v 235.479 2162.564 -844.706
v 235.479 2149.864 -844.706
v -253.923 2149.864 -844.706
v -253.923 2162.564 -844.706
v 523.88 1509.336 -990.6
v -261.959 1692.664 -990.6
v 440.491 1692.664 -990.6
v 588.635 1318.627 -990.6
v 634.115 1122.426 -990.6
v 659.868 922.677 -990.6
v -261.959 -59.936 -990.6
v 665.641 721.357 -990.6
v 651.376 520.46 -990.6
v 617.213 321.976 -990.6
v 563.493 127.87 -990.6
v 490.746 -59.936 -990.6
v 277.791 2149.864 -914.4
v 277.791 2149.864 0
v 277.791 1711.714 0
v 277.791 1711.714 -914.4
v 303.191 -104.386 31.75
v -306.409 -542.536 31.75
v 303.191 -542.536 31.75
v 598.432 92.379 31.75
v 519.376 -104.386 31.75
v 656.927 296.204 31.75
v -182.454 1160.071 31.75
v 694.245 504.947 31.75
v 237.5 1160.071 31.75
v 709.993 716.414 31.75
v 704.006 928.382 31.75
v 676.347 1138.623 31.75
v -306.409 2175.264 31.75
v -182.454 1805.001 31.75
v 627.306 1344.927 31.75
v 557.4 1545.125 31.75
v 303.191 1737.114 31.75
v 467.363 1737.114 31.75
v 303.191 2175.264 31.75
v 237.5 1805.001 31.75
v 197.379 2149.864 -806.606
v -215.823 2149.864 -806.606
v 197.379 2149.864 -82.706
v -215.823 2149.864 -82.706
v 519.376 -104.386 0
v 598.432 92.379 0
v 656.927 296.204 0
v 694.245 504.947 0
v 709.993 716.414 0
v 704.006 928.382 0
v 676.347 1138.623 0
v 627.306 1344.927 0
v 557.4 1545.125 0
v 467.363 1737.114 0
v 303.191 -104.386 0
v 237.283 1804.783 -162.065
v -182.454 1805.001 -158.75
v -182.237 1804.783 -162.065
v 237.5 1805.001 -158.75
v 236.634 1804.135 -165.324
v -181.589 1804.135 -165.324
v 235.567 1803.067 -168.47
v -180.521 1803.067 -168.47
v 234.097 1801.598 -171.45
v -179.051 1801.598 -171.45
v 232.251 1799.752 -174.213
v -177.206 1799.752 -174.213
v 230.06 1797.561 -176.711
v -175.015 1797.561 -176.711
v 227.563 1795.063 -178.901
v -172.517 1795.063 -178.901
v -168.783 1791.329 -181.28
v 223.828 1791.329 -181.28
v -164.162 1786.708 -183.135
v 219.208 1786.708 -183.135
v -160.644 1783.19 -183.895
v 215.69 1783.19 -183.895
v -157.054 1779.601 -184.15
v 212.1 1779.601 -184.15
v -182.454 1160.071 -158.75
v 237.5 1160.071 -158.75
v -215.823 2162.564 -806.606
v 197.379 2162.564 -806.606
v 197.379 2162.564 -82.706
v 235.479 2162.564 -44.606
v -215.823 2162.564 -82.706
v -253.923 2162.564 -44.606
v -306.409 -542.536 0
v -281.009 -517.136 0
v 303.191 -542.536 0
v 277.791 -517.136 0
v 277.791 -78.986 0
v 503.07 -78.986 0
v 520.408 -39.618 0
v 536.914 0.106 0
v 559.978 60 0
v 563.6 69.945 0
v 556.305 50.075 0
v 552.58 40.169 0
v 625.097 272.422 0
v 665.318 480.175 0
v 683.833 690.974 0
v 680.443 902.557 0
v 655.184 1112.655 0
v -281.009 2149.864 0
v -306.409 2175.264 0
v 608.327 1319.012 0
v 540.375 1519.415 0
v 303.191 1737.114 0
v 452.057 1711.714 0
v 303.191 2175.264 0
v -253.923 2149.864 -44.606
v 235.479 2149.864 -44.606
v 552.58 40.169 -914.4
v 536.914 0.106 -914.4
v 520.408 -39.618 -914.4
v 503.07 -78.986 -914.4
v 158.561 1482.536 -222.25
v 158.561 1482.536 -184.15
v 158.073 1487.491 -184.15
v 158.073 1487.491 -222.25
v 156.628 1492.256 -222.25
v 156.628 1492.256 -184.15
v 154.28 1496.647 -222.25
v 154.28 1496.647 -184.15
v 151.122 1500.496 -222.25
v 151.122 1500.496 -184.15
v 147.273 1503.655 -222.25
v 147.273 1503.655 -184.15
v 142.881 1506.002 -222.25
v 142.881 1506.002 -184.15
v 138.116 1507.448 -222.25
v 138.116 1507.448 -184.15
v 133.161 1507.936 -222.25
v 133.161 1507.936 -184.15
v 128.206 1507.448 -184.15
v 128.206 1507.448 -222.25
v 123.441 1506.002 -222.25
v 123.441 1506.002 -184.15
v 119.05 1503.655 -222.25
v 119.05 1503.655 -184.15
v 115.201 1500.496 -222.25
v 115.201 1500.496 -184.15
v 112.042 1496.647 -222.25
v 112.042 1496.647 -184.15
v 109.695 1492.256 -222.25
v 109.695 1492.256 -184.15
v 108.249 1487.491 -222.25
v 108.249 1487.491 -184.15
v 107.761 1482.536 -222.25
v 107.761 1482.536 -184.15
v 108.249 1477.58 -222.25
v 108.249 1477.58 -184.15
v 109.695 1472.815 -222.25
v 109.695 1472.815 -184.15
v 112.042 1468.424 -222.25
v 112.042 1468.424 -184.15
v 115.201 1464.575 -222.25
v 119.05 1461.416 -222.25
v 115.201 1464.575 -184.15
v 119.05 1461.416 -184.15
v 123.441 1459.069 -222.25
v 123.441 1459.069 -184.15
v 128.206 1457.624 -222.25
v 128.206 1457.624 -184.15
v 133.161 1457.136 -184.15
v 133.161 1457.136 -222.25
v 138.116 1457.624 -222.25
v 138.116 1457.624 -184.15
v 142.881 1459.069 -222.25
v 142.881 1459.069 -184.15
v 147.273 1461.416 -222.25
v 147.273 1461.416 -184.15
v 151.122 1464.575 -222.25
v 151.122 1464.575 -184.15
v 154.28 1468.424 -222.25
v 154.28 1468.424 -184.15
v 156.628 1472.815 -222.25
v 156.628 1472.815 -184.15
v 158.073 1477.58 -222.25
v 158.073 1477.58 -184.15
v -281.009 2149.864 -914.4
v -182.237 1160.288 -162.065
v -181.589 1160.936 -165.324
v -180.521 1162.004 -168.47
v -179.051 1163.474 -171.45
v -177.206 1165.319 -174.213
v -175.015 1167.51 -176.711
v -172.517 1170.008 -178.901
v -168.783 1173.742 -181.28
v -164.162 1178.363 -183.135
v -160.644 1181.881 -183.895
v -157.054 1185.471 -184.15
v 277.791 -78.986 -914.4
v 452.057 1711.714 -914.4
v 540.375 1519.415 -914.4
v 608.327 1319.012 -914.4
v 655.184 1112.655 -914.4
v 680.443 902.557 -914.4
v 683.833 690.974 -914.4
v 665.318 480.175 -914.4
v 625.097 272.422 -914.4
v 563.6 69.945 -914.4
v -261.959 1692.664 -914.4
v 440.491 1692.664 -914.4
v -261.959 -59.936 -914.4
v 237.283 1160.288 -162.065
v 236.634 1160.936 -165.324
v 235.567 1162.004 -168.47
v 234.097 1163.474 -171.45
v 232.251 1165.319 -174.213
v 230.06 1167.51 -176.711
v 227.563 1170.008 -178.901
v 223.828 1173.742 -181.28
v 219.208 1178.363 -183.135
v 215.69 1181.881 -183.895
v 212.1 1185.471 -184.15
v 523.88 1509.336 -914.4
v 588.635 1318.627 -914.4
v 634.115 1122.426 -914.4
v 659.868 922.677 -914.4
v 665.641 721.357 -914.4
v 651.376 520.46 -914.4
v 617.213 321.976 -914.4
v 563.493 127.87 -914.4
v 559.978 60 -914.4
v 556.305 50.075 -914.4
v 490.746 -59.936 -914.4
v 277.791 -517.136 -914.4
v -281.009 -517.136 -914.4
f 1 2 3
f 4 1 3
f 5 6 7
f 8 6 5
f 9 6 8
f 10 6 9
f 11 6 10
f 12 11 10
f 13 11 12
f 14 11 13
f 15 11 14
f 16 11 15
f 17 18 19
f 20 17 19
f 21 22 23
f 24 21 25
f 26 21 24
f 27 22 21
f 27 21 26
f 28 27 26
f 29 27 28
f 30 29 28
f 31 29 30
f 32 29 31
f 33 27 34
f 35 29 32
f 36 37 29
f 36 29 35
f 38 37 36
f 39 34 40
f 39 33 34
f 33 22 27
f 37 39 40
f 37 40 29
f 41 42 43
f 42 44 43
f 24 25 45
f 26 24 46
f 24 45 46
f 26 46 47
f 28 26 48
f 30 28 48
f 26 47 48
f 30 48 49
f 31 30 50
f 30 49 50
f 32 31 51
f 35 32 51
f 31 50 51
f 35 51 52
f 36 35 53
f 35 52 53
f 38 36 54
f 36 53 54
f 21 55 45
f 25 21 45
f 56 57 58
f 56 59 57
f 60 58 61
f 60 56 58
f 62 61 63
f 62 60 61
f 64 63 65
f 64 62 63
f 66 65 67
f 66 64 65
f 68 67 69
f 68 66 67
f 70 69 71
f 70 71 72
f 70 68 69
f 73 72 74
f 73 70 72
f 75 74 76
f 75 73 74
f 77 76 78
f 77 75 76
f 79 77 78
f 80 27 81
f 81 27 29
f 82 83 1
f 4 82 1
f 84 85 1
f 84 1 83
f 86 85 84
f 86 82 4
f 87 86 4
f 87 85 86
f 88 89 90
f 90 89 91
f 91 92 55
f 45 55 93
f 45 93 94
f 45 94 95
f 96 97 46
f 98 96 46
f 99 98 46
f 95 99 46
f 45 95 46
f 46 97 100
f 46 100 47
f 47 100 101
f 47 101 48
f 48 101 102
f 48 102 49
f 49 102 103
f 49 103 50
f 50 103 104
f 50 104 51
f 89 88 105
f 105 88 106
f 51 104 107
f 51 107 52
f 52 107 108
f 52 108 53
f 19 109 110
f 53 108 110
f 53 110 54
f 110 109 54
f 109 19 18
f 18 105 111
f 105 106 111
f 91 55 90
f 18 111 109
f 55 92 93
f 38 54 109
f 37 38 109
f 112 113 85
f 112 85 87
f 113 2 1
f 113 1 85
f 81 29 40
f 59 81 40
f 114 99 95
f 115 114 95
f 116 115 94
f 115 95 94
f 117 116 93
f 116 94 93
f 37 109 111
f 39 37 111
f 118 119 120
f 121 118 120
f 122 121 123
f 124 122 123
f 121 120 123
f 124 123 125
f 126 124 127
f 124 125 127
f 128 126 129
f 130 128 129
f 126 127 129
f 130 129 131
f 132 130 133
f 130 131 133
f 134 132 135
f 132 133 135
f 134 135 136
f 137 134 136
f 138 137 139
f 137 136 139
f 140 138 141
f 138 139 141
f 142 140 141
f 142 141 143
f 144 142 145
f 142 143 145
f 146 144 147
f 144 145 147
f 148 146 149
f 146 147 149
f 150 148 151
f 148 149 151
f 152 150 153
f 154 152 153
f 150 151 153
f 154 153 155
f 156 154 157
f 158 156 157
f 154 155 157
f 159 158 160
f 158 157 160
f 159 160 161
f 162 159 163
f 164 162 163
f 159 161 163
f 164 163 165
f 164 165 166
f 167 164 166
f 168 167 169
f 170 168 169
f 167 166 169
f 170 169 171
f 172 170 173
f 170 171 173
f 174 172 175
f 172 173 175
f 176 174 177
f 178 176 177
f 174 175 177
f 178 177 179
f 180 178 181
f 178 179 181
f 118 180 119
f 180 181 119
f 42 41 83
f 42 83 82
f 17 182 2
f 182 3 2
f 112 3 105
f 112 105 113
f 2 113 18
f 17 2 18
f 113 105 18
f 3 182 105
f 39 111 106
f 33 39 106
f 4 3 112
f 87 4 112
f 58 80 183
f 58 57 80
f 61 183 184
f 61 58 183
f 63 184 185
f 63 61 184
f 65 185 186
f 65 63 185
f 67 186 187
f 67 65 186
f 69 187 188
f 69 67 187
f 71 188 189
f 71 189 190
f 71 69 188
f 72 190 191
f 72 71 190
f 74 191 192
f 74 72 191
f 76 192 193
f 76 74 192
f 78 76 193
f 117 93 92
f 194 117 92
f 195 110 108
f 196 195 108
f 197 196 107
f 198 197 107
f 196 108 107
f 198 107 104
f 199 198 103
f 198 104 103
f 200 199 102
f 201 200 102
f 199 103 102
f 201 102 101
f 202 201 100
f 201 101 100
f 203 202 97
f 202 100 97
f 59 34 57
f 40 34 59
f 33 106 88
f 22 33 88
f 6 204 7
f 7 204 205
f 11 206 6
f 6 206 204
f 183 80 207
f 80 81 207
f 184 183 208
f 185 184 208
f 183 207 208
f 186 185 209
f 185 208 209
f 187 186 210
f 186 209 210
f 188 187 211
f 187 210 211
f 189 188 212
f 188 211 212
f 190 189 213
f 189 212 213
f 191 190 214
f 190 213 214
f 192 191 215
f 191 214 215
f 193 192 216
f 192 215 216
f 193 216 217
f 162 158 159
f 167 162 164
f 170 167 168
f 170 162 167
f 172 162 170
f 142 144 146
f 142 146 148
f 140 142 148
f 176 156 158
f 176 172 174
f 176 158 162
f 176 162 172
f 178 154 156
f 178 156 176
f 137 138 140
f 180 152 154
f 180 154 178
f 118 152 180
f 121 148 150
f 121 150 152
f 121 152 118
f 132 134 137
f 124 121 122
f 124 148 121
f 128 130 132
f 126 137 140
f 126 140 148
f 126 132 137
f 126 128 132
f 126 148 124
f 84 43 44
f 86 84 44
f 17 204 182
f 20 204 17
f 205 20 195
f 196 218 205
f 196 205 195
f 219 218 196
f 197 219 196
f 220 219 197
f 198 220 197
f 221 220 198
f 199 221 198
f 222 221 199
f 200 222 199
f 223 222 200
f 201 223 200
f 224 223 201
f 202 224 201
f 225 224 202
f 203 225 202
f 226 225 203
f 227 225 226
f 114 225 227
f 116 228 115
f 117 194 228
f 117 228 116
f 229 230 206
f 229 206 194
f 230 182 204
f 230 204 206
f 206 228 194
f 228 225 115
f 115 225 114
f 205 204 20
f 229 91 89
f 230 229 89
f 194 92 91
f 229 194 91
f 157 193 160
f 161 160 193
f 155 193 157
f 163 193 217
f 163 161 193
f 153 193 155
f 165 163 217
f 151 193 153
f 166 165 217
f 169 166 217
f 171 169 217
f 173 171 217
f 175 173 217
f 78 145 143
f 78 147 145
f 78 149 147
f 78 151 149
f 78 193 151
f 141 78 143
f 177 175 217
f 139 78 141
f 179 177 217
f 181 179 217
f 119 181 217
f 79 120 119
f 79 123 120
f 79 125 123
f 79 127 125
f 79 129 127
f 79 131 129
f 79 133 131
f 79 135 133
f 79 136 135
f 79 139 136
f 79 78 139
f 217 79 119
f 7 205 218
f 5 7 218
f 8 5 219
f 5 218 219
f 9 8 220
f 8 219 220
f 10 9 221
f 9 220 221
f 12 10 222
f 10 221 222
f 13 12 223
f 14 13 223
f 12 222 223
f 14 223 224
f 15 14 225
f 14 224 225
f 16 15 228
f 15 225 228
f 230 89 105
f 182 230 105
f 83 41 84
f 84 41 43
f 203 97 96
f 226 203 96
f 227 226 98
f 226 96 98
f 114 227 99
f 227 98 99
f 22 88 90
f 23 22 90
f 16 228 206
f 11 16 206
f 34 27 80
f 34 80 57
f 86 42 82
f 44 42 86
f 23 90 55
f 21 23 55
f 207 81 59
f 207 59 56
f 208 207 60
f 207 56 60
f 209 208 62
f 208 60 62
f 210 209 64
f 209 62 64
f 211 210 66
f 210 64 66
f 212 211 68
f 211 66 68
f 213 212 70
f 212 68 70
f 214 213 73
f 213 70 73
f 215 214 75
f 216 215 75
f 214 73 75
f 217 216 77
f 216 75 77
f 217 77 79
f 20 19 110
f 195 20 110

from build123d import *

# Parameters (mm, degrees)
F1_DEPTH  = 31.75
F3_DEPTH  = 914.4
F5_DEPTH  = 76.2
F6_W      = 489.402067
F6_H      = 800.100014
F6_W_2    = 413.202067
F6_H_2    = 723.900014
F7_DEPTH  = 12.7
F8_W      = 419.95435
F8_H      = 644.930006
F9_DEPTH  = 215.9
F10_R     = 25.4
F11_R     = 25.4
F12_DEPTH = 38.1


with BuildPart() as f1:
    # F0 (on Top) → F1 (new body)
    with BuildSketch(Plane.XY):
        with BuildLine():
            Line((-306.409396, 2175.264088), (-306.409396, -542.535912))
            Line((-306.409396, -542.535912), (303.190604, -542.535912))
            Line((303.190604, -542.535912), (303.190604, -104.385912))
            Line((303.190604, -104.385912), (519.375622, -104.385912))
            ThreePointArc((519.375622, -104.385912), (709.71736, 822.474711), (467.363477, 1737.114088))
            Line((467.363477, 1737.114088), (303.190604, 1737.114088))
            Line((303.190604, 1737.114088), (303.190604, 2175.264088))
            Line((303.190604, 2175.264088), (-306.409396, 2175.264088))
        make_face()
    extrude(amount=F1_DEPTH)

    # F2 (on face) → F3 (join)
    with BuildSketch(Plane(origin=(0, 0, 0), x_dir=(1, 0, 0), z_dir=(0, 0, -1))):
        with BuildLine():
            Line((277.790604, 517.135912), (-281.009396, 517.135912))
            Line((-281.009396, 517.135912), (-281.009396, -2149.864088))
            Line((-281.009396, -2149.864088), (277.790604, -2149.864088))
            Line((277.790604, -2149.864088), (277.790604, -1711.714088))
            Line((277.790604, -1711.714088), (452.056612, -1711.714088))
            ThreePointArc((452.056612, -1711.714088), (680.443153, -902.557054), (563.59979, -69.944813))
            ThreePointArc((563.59979, -69.944813), (558.147777, -55.035253), (552.580069, -40.16851))
            ThreePointArc((552.580069, -40.16851), (528.765772, 19.79969), (503.069531, 78.985912))
            Line((503.069531, 78.985912), (277.790604, 78.985912))
            Line((277.790604, 78.985912), (277.790604, 517.135912))
        make_face()
    extrude(amount=F3_DEPTH)

    # F4 (on face) → F5 (join)
    with BuildSketch(Plane(origin=(0, 0, -914.4), x_dir=(1, 0, 0), z_dir=(0, 0, -1))):
        with BuildLine():
            Line((490.74557, 59.93588), (-261.959396, 59.93588))
            Line((-261.959396, 59.93588), (-261.959396, -1692.66412))
            Line((-261.959396, -1692.66412), (440.49096, -1692.66412))
            ThreePointArc((440.49096, -1692.66412), (665.26035, -822.088721), (490.74557, 59.93588))
        make_face()
    extrude(amount=F5_DEPTH)

    # F6 (on face) → F7 (join)
    with BuildSketch(Plane(origin=(0, 2149.864088, 0), x_dir=(-1, 0, 0), z_dir=(0, 1, 0))):
        with Locations((9.221965, -444.656052)):
            Rectangle(F6_W, F6_H)
        with Locations((9.221965, -444.656052)):
            Rectangle(F6_W_2, F6_H_2, mode=Mode.SUBTRACT)
    extrude(amount=F7_DEPTH)

    # F8 (on face) → F9 (cut)
    with BuildSketch(Plane.XY.offset(31.75)):
        with Locations((27.522791, 1482.535601)):
            Rectangle(F8_W, F8_H)
    extrude(amount=-F9_DEPTH, mode=Mode.SUBTRACT)

    # F10
    f10_edges = [f1.edges().sort_by_distance(p)[0] for p in [
        (27.522791, 1805.000604, -184.15),
        (-182.454384, 1482.535601, -184.15),
        (237.499966, 1482.535601, -184.15),
        (27.522791, 1160.070598, -184.15),
    ]]
    fillet(f10_edges, radius=F10_R)

    # F11 (on face) → F12 (cut)
    with BuildSketch(Plane.XY.offset(-184.15)):
        with Locations((133.161105, 1482.535601)):
            Circle(F11_R)
    extrude(amount=-F12_DEPTH, mode=Mode.SUBTRACT)


solid = f1.part
